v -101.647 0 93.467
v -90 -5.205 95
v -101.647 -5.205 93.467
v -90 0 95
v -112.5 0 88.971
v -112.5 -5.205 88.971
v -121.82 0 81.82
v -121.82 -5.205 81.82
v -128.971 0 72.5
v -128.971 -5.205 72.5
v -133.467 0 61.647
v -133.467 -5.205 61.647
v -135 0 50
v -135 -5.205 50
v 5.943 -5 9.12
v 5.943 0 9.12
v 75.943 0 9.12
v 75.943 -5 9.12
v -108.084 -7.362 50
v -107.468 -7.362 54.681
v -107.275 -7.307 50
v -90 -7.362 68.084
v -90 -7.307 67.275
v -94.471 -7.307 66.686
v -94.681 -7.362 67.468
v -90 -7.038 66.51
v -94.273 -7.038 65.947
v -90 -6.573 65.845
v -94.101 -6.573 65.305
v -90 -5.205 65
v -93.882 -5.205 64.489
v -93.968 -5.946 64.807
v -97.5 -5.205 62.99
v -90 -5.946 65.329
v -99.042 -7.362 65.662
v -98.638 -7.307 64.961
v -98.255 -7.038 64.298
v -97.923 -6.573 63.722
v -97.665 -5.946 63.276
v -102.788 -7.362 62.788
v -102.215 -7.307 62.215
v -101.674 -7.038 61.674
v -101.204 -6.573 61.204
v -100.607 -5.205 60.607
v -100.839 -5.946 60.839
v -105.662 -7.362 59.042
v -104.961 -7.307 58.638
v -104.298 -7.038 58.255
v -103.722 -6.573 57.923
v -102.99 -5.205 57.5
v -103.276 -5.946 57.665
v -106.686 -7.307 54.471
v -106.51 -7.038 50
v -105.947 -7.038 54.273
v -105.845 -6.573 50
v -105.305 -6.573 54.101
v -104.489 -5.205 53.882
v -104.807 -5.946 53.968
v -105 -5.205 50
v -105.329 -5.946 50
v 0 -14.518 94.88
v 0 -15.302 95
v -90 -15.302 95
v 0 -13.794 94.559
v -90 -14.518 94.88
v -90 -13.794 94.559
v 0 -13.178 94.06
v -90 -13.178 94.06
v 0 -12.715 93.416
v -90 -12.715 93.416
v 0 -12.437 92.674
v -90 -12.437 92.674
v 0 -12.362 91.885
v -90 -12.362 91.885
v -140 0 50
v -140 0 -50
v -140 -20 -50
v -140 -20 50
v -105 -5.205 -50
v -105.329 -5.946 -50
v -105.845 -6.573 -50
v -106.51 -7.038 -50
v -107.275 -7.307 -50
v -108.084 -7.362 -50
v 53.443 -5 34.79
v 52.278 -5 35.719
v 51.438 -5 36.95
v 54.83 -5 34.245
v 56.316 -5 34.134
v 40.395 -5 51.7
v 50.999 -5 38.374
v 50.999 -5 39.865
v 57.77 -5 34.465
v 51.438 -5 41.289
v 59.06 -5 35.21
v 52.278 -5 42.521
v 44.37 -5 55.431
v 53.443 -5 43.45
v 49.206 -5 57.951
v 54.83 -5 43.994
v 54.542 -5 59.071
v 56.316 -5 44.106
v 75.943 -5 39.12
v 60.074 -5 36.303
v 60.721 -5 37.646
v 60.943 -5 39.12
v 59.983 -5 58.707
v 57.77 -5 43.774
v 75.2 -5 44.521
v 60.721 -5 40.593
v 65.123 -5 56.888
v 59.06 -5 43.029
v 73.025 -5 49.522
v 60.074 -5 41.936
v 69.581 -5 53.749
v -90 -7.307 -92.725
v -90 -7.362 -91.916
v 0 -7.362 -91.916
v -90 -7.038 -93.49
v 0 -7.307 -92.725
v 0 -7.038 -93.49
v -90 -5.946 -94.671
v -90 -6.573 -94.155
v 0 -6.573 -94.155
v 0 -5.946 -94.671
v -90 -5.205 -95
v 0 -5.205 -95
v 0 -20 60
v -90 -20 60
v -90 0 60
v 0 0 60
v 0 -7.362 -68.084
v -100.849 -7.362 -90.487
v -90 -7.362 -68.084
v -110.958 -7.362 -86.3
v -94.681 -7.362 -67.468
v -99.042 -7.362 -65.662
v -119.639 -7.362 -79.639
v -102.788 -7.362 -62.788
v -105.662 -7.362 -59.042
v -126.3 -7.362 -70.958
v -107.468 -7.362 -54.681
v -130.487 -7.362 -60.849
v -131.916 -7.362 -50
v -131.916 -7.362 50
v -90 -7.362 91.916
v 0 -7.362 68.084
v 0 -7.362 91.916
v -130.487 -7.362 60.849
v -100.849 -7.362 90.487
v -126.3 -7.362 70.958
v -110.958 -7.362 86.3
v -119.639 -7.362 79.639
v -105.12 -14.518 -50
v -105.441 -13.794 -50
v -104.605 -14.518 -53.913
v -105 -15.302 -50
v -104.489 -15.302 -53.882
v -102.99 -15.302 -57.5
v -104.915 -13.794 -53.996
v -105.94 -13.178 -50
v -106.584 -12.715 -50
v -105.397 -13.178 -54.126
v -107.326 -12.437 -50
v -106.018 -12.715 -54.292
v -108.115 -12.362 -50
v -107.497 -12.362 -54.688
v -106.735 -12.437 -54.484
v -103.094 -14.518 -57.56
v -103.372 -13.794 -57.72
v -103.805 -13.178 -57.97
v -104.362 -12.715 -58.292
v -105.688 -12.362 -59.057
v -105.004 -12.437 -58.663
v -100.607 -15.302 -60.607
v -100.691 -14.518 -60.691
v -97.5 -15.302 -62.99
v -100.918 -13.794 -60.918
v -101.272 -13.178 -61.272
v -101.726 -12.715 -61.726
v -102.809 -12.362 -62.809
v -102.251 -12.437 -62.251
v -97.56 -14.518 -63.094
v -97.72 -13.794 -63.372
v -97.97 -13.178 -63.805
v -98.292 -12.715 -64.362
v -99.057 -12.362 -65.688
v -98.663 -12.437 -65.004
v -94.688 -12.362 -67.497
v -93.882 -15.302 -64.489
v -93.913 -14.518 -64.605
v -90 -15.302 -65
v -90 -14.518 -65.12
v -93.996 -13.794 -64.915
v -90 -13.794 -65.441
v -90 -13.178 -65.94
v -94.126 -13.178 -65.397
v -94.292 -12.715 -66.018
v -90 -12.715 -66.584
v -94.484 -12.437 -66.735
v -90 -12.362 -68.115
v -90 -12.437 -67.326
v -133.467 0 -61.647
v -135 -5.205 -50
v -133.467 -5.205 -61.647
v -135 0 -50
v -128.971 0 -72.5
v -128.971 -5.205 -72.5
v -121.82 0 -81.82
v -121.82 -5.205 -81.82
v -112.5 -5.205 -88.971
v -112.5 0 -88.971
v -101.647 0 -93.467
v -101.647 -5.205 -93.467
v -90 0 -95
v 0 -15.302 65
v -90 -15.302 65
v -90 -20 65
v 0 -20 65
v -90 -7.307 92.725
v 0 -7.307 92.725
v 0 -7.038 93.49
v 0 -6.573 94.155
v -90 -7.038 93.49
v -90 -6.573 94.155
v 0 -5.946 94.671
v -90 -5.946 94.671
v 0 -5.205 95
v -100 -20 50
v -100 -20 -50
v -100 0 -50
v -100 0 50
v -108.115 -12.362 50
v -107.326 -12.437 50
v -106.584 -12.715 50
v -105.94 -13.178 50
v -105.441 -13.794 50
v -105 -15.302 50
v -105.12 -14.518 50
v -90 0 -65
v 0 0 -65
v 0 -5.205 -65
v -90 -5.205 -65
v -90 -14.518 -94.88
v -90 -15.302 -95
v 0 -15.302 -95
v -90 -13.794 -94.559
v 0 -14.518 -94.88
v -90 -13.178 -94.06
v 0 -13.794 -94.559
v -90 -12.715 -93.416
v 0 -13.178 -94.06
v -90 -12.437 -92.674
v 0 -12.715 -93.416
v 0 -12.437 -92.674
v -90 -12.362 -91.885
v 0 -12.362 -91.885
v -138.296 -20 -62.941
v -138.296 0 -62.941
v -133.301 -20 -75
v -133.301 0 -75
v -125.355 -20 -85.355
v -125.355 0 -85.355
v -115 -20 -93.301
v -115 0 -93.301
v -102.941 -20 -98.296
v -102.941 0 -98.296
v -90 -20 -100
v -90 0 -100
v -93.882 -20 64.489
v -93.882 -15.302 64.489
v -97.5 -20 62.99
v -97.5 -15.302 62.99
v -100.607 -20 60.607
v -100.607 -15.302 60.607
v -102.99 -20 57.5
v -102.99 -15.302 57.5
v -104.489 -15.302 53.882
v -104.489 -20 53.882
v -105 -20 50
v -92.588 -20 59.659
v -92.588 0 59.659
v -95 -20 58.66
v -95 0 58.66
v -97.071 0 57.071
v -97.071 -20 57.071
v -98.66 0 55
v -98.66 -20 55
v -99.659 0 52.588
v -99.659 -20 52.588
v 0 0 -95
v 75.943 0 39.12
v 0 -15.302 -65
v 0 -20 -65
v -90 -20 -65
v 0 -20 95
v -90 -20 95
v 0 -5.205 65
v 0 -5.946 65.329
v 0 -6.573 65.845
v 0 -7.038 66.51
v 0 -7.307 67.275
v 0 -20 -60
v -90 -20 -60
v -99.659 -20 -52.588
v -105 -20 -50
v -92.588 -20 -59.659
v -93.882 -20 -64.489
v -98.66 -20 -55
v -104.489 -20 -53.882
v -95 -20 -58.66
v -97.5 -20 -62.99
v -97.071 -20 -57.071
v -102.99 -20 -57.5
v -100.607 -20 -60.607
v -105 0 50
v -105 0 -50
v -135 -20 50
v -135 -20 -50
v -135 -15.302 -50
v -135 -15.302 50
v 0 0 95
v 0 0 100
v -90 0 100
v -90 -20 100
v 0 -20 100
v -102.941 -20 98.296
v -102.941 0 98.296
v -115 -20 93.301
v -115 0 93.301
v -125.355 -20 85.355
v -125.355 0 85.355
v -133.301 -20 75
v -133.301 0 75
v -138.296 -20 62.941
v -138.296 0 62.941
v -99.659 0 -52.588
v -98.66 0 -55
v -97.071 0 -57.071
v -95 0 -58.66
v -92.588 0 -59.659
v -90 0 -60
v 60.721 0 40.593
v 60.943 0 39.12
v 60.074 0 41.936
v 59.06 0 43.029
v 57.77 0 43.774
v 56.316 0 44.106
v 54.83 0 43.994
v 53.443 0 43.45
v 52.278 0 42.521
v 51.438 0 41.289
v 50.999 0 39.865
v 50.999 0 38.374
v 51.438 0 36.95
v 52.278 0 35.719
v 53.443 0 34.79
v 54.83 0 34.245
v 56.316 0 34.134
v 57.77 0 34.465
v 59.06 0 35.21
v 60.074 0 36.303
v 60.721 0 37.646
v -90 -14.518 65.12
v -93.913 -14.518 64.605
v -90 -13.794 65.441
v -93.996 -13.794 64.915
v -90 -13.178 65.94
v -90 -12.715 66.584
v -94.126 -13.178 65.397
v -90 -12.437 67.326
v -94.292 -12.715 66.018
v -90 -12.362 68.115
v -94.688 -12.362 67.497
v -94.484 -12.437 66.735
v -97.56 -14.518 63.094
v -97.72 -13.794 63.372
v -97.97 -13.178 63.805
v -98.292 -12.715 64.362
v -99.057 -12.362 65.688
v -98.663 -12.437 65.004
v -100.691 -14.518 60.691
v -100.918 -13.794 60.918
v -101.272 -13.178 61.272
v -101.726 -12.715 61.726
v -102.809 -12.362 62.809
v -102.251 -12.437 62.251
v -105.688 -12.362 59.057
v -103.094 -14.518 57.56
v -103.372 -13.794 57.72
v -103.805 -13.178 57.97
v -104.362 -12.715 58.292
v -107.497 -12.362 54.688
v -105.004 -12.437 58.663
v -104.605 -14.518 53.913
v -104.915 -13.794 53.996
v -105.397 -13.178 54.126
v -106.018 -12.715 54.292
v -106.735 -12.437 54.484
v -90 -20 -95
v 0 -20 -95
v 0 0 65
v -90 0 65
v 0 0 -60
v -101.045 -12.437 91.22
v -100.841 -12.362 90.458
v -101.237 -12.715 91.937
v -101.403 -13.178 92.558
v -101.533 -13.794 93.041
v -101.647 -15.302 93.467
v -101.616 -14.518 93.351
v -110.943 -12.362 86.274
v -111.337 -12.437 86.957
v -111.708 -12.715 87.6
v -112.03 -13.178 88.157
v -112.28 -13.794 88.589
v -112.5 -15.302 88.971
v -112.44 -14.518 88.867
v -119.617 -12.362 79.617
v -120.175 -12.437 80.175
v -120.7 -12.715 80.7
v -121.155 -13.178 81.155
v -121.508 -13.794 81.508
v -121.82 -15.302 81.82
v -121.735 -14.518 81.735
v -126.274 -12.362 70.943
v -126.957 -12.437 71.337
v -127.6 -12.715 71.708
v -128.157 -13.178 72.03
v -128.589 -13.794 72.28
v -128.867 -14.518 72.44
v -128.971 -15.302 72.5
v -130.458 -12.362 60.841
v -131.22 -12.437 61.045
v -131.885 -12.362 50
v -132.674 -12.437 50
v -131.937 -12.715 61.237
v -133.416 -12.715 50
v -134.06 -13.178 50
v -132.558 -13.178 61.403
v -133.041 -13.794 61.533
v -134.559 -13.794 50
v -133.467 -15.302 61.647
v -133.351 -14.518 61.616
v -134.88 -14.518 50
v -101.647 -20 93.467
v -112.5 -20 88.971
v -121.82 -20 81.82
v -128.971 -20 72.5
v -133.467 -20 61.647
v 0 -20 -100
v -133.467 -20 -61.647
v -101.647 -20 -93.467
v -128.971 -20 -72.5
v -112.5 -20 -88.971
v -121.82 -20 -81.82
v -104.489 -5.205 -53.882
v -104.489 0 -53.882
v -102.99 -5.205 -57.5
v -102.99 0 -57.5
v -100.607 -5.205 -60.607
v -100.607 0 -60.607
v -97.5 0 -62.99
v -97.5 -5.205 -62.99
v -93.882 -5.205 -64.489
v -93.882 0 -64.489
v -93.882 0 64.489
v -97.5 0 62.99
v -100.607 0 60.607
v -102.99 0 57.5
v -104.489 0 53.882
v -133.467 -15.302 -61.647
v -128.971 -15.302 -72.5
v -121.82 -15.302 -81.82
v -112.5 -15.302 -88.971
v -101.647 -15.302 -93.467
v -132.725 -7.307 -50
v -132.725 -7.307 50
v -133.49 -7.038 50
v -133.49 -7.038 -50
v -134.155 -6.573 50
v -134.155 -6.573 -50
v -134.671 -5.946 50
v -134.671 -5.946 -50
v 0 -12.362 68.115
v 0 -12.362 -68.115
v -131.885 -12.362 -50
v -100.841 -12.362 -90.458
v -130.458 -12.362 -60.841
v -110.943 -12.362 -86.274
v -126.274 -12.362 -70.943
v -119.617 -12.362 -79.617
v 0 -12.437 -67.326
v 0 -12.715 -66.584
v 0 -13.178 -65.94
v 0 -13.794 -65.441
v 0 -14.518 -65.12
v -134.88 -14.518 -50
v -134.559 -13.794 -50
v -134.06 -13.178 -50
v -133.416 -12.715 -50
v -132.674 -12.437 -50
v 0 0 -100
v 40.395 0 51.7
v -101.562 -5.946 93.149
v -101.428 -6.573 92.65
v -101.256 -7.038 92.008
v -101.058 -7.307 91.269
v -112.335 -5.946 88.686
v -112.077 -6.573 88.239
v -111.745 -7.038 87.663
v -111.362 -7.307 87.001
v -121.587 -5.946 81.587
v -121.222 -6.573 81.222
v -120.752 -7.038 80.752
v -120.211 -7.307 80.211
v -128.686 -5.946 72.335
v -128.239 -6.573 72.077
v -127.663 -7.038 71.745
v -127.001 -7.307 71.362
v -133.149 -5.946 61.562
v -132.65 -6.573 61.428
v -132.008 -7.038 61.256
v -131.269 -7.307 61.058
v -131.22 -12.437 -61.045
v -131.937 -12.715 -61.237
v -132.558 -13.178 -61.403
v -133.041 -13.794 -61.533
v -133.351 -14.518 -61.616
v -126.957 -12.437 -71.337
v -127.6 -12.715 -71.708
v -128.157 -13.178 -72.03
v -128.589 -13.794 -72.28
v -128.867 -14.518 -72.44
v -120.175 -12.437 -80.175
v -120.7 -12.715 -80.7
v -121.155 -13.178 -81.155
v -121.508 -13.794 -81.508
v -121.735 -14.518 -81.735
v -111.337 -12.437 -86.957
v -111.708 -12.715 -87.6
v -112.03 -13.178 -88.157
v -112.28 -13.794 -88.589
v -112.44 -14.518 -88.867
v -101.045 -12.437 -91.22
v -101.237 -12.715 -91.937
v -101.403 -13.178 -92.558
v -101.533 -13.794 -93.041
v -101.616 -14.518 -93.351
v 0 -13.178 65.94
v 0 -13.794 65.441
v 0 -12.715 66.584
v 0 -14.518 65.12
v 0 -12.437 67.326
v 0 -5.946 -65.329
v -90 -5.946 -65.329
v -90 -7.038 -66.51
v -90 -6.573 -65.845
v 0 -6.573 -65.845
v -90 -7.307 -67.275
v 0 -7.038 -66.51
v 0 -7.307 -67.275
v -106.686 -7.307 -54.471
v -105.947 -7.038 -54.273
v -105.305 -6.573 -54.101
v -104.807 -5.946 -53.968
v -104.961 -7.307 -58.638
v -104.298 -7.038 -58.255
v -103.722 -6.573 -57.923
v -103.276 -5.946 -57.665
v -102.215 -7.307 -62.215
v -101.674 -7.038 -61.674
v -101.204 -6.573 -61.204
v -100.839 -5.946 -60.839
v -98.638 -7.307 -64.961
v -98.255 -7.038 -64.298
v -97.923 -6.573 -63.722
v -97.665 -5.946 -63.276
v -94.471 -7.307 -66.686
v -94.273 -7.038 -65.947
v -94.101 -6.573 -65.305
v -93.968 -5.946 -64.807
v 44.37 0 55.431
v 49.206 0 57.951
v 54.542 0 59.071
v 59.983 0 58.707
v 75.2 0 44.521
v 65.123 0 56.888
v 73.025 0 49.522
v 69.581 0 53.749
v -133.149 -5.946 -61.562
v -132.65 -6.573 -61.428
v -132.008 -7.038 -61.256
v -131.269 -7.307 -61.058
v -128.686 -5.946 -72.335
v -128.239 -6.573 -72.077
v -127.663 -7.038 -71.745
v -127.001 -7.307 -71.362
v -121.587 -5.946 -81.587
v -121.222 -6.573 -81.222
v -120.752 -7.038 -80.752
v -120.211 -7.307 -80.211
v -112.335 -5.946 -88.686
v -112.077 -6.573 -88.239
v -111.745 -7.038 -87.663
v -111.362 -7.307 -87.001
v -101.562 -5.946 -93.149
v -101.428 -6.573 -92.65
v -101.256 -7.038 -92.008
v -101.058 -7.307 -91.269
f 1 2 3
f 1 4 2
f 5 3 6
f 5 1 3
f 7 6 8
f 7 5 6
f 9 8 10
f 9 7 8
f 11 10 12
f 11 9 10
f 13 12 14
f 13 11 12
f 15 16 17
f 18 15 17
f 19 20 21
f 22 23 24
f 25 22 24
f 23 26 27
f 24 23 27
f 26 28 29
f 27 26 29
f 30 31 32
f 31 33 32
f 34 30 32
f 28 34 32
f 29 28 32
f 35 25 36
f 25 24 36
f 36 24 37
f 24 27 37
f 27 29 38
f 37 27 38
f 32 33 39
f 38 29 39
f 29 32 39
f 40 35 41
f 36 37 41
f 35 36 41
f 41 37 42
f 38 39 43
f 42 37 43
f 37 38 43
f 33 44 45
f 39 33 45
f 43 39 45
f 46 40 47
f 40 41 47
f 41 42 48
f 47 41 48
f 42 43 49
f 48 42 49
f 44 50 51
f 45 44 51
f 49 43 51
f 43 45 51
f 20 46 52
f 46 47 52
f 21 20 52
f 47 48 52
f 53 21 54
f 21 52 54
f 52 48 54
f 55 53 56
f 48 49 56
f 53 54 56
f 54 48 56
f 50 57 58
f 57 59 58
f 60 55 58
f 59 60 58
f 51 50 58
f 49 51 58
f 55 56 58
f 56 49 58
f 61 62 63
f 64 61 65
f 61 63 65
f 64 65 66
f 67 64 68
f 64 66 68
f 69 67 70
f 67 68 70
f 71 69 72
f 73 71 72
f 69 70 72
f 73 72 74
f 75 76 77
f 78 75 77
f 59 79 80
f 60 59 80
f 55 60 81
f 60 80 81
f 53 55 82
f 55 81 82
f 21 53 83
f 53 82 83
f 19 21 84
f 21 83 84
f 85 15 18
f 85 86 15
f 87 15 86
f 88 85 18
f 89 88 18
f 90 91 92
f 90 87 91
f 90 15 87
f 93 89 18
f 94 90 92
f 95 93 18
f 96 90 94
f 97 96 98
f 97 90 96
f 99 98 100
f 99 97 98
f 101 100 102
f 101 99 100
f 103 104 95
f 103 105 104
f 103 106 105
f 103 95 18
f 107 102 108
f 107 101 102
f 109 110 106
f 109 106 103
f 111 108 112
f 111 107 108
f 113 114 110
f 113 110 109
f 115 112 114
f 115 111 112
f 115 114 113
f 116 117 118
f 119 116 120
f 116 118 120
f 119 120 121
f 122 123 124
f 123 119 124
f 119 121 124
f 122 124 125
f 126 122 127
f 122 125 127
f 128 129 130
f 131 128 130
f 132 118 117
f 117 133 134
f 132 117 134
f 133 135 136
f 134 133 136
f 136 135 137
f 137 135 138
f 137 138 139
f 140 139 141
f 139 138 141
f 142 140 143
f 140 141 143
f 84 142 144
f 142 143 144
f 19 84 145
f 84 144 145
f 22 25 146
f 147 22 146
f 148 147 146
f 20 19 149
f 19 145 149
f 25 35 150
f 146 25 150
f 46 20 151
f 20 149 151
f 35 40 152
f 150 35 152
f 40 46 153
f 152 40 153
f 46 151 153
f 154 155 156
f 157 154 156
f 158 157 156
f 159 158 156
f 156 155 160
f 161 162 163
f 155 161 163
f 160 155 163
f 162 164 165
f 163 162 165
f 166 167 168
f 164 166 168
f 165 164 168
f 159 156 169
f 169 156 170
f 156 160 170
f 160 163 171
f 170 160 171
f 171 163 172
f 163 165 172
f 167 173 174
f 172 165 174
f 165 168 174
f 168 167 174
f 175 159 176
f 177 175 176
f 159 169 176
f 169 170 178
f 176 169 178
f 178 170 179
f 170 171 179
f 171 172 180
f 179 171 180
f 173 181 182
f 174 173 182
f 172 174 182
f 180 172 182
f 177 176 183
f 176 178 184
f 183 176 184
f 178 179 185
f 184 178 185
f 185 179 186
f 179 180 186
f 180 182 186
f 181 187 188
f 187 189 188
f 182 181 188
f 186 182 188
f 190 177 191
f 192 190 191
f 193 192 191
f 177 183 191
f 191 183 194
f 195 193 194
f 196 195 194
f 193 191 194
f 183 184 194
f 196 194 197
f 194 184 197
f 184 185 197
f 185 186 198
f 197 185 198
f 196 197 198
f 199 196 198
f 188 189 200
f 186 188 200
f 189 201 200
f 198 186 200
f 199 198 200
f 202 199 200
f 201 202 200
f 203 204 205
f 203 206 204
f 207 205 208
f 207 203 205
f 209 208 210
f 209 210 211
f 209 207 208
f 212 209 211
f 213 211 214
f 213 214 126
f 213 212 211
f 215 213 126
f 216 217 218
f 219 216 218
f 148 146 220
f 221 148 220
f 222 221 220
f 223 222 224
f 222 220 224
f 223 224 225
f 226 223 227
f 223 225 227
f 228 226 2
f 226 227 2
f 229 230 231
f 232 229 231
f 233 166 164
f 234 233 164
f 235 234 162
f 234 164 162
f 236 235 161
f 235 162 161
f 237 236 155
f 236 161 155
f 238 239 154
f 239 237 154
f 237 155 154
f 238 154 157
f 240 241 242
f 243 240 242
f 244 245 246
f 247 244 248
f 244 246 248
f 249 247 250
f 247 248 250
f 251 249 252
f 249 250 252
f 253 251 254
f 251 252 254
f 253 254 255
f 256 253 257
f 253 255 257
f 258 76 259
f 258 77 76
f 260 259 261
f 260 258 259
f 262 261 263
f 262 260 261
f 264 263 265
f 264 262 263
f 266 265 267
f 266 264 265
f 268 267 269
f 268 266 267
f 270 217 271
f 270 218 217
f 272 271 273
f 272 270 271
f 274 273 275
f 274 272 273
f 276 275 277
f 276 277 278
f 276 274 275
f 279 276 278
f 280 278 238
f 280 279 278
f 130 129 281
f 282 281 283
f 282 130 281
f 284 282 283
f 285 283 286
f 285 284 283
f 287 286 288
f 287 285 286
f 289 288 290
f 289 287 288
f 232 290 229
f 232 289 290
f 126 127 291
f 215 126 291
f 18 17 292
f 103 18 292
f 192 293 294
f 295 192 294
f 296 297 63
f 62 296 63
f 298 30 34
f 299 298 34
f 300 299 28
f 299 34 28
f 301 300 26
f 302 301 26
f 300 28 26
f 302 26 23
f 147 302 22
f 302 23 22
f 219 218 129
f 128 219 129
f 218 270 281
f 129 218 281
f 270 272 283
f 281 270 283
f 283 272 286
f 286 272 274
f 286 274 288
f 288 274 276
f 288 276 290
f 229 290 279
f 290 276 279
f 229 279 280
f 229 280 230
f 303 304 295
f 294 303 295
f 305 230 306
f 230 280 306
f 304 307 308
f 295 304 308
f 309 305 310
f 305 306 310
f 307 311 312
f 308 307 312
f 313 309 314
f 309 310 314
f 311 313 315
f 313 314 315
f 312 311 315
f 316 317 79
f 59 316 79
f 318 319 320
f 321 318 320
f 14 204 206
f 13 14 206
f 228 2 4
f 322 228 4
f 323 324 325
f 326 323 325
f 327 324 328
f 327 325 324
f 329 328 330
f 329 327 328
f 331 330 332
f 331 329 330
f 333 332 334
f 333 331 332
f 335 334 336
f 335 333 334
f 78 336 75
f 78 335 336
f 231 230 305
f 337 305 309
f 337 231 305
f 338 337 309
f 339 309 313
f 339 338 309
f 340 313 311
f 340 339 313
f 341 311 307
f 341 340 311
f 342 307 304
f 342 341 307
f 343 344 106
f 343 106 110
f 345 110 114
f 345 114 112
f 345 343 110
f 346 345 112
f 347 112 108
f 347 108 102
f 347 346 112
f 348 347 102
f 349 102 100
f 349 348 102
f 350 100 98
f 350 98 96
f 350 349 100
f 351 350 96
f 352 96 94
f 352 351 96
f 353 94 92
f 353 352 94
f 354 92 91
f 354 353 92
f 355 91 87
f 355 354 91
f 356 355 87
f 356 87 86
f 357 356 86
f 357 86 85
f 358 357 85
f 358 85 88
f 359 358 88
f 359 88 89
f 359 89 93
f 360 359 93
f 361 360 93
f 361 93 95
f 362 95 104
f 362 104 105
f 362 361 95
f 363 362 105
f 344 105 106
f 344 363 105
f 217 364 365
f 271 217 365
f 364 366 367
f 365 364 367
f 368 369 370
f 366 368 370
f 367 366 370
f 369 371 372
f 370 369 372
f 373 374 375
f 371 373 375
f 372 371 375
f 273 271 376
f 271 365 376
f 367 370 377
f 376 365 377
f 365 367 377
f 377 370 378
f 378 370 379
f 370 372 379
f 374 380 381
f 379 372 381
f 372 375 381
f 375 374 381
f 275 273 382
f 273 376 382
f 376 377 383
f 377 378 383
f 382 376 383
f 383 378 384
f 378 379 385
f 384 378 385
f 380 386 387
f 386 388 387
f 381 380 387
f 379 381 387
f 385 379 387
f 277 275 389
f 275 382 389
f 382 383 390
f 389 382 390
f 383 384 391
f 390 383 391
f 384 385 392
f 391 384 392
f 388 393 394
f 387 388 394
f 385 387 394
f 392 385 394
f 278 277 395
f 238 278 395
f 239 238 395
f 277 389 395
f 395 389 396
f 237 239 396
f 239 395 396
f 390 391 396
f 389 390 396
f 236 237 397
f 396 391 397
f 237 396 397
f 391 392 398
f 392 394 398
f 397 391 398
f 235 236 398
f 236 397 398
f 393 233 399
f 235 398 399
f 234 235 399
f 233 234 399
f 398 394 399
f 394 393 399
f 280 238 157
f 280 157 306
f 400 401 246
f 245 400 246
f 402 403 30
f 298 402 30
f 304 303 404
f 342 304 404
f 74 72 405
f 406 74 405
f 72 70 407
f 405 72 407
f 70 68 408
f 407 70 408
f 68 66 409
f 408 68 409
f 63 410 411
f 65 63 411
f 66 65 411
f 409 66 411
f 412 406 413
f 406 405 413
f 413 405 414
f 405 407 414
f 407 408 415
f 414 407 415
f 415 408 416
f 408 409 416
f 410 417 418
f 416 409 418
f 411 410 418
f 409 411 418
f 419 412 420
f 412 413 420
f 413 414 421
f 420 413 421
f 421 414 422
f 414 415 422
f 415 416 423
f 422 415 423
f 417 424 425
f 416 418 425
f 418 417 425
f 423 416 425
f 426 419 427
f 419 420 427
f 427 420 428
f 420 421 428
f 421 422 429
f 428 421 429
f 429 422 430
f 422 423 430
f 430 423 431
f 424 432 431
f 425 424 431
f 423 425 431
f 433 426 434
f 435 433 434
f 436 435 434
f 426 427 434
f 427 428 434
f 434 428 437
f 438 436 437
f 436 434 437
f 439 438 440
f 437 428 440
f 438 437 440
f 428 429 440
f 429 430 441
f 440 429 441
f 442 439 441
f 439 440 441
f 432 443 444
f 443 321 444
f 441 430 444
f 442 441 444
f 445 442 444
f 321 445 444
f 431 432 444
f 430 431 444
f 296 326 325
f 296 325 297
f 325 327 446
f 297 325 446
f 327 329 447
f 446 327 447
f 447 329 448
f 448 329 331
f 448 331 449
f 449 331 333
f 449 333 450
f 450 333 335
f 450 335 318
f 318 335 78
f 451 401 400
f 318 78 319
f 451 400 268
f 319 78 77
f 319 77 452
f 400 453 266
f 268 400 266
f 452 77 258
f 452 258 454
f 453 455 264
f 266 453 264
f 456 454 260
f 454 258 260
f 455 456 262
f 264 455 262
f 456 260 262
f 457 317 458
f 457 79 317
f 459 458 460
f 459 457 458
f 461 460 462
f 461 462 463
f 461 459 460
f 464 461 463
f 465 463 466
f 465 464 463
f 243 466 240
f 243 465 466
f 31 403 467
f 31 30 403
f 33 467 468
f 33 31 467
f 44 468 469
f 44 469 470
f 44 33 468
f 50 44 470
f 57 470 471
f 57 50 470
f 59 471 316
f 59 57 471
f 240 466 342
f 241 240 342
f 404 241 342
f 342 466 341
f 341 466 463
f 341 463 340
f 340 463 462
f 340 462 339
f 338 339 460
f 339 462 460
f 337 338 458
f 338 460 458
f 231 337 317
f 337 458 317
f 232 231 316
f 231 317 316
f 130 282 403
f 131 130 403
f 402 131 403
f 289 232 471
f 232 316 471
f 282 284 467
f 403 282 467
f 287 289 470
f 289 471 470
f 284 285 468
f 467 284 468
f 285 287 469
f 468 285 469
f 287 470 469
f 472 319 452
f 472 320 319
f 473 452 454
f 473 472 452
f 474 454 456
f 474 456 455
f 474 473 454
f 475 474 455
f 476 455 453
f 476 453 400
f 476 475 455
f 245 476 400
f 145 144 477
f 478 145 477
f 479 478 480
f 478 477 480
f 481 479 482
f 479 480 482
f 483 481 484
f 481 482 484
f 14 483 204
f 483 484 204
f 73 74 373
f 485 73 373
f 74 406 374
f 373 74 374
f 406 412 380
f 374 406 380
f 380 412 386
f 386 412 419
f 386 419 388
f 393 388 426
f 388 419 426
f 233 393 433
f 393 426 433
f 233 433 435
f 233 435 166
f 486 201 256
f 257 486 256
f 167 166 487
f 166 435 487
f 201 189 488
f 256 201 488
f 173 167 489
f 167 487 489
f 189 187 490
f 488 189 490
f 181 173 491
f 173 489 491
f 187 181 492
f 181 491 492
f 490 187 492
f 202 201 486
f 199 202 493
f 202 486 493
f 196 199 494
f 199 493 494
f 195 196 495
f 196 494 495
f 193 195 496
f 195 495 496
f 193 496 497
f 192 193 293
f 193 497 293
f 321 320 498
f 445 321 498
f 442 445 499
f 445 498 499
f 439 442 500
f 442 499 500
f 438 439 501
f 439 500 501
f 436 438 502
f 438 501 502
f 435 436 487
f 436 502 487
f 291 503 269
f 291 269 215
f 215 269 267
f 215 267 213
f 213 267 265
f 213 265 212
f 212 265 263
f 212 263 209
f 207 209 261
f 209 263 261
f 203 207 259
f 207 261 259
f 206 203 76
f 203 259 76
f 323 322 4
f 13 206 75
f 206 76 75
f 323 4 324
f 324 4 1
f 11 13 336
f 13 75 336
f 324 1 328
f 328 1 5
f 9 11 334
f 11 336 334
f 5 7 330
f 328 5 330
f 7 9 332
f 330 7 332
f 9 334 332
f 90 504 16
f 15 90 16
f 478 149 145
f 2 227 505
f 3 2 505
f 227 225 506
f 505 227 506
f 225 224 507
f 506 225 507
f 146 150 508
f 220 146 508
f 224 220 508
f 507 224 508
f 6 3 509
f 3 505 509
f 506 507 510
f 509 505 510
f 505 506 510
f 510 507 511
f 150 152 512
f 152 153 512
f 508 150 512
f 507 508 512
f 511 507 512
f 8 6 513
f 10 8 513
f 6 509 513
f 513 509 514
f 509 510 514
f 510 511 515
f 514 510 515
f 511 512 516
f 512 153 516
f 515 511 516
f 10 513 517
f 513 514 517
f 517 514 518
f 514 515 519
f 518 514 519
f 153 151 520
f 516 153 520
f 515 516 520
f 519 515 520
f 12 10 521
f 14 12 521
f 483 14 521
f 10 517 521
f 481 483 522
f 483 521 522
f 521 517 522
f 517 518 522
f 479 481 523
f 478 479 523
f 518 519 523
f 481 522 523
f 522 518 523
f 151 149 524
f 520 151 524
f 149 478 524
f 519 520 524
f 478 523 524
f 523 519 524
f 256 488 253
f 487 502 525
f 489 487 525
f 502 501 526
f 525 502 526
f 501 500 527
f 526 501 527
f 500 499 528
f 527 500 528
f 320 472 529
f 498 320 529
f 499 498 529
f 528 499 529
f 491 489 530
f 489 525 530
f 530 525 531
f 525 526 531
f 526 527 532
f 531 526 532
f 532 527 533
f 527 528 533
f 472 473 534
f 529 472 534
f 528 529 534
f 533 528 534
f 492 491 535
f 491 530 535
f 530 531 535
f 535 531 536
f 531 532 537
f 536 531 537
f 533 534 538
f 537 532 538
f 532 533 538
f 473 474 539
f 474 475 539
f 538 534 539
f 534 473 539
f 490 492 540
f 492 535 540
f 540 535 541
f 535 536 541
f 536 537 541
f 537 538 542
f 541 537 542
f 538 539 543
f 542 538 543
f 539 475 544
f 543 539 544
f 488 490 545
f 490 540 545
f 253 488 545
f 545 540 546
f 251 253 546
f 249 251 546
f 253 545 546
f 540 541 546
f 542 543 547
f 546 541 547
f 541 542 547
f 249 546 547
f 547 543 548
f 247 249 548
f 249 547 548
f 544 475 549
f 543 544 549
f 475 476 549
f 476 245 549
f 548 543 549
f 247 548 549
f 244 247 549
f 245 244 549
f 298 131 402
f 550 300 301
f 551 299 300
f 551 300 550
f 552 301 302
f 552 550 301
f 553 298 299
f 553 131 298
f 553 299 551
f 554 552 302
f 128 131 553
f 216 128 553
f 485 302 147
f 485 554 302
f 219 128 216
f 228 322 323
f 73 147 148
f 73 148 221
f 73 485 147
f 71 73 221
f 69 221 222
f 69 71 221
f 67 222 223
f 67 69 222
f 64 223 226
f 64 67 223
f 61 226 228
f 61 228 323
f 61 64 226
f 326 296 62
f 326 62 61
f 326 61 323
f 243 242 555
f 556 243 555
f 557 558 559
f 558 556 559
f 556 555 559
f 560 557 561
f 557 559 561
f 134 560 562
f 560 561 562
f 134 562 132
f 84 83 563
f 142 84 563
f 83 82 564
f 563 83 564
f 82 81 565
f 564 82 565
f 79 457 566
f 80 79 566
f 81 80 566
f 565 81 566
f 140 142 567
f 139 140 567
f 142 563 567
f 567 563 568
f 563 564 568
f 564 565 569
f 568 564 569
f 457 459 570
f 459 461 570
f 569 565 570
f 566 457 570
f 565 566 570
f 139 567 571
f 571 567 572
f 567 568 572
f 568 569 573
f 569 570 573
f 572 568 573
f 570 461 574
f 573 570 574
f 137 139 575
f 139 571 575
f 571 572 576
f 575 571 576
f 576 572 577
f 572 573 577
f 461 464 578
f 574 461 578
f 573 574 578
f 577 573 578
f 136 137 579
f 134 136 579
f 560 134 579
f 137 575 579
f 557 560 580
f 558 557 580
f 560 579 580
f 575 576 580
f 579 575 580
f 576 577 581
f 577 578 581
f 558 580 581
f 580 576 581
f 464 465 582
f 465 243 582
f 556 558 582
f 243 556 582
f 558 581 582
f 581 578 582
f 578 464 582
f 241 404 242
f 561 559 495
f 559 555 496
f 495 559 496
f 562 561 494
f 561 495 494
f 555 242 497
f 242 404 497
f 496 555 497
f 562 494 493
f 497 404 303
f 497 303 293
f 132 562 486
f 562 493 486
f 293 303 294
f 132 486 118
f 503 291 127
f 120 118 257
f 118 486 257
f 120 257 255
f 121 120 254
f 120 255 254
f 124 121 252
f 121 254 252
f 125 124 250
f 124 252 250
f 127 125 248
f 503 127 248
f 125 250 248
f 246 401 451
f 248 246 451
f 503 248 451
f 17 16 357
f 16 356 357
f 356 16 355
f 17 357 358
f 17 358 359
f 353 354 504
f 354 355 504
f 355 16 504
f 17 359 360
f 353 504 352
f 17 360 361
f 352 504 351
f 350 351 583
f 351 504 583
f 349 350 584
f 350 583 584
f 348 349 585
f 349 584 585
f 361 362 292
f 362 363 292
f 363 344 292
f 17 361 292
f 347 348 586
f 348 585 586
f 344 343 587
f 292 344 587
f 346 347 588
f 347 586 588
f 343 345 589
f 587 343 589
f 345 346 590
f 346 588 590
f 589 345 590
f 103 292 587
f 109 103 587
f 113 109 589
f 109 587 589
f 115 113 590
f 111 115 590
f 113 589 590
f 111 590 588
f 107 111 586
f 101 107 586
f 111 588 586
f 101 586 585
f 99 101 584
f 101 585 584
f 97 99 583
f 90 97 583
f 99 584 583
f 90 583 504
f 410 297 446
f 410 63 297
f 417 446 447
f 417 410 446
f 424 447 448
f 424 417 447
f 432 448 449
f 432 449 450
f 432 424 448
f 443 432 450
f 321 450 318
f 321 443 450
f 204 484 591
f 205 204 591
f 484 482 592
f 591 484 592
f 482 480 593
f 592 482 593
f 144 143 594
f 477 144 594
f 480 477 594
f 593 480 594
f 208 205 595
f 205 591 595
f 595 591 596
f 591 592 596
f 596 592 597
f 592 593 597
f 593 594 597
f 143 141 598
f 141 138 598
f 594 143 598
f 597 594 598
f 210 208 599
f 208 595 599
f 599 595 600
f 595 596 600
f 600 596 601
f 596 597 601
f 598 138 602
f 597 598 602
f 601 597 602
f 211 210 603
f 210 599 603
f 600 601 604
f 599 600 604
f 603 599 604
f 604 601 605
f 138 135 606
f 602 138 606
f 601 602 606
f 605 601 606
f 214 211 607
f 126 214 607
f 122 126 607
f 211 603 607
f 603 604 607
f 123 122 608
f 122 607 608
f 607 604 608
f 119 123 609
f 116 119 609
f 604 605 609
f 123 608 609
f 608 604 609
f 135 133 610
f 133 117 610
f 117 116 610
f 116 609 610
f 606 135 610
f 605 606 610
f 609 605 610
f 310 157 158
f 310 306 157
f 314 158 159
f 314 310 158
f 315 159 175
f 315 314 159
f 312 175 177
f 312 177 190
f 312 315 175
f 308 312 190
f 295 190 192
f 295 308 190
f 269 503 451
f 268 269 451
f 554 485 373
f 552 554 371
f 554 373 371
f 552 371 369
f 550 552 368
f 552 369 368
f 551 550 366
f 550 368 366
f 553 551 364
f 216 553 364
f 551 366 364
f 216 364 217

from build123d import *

# Parameters (mm, degrees)
F3_R     = 5
F4_DEPTH = 5


with BuildPart() as f2:
    # F2: sweep along a path in F0
    with BuildLine(Plane.XZ) as f2_path:
        Line((0, 60), (-90, 60))
        ThreePointArc((-90, 60), (-97.071068, 57.071068), (-100, 50))
        Line((-100, 50), (-100, 0))
        Line((-100, 0), (-100, -50))
        ThreePointArc((-100, -50), (-97.071068, -57.071068), (-90, -60))
        Line((-90, -60), (0, -60))
    # F1 (on Right) → F2 (sweep)
    with BuildSketch(Plane.YZ):
        with BuildLine():
            Line((-20, 60), (0, 60))
            Line((0, 60), (0, 65))
            Line((0, 65), (-5.204993, 65))
            ThreePointArc((-5.204993, 65), (-6.827663, 66.161783), (-7.362441, 68.084491))
            Line((-7.362441, 68.084491), (-7.362441, 91.915509))
            ThreePointArc((-7.362441, 91.915509), (-6.827663, 93.838217), (-5.204993, 95))
            Line((-5.204993, 95), (0, 95))
            Line((0, 95), (0, 100))
            Line((0, 100), (-20, 100))
            Line((-20, 100), (-20, 95))
            Line((-20, 95), (-15.301882, 95))
            ThreePointArc((-15.301882, 95), (-13.178438, 94.059642), (-12.362441, 91.885375))
            Line((-12.362441, 91.885375), (-12.362441, 68.114625))
            ThreePointArc((-12.362441, 68.114625), (-13.178438, 65.940358), (-15.301882, 65))
            Line((-15.301882, 65), (-20, 65))
            Line((-20, 65), (-20, 60))
        make_face()
    sweep(path=f2_path.line)


with BuildPart() as f4:
    # F3 (on Front) → F4 (new body)
    with BuildSketch(Plane.XZ):
        with BuildLine():
            Line((40.394755, 51.699712), (5.9428, 9.119637))
            Line((5.9428, 9.119637), (75.9428, 9.119637))
            Line((75.9428, 9.119637), (75.9428, 39.119637))
            ThreePointArc((75.9428, 39.119637), (62.615097, 57.973826), (40.394755, 51.699712))
        make_face()
        with Locations((55.9428, 39.119637)):
            Circle(F3_R, mode=Mode.SUBTRACT)
    extrude(amount=F4_DEPTH)


solid = Compound([f2.part, f4.part])
